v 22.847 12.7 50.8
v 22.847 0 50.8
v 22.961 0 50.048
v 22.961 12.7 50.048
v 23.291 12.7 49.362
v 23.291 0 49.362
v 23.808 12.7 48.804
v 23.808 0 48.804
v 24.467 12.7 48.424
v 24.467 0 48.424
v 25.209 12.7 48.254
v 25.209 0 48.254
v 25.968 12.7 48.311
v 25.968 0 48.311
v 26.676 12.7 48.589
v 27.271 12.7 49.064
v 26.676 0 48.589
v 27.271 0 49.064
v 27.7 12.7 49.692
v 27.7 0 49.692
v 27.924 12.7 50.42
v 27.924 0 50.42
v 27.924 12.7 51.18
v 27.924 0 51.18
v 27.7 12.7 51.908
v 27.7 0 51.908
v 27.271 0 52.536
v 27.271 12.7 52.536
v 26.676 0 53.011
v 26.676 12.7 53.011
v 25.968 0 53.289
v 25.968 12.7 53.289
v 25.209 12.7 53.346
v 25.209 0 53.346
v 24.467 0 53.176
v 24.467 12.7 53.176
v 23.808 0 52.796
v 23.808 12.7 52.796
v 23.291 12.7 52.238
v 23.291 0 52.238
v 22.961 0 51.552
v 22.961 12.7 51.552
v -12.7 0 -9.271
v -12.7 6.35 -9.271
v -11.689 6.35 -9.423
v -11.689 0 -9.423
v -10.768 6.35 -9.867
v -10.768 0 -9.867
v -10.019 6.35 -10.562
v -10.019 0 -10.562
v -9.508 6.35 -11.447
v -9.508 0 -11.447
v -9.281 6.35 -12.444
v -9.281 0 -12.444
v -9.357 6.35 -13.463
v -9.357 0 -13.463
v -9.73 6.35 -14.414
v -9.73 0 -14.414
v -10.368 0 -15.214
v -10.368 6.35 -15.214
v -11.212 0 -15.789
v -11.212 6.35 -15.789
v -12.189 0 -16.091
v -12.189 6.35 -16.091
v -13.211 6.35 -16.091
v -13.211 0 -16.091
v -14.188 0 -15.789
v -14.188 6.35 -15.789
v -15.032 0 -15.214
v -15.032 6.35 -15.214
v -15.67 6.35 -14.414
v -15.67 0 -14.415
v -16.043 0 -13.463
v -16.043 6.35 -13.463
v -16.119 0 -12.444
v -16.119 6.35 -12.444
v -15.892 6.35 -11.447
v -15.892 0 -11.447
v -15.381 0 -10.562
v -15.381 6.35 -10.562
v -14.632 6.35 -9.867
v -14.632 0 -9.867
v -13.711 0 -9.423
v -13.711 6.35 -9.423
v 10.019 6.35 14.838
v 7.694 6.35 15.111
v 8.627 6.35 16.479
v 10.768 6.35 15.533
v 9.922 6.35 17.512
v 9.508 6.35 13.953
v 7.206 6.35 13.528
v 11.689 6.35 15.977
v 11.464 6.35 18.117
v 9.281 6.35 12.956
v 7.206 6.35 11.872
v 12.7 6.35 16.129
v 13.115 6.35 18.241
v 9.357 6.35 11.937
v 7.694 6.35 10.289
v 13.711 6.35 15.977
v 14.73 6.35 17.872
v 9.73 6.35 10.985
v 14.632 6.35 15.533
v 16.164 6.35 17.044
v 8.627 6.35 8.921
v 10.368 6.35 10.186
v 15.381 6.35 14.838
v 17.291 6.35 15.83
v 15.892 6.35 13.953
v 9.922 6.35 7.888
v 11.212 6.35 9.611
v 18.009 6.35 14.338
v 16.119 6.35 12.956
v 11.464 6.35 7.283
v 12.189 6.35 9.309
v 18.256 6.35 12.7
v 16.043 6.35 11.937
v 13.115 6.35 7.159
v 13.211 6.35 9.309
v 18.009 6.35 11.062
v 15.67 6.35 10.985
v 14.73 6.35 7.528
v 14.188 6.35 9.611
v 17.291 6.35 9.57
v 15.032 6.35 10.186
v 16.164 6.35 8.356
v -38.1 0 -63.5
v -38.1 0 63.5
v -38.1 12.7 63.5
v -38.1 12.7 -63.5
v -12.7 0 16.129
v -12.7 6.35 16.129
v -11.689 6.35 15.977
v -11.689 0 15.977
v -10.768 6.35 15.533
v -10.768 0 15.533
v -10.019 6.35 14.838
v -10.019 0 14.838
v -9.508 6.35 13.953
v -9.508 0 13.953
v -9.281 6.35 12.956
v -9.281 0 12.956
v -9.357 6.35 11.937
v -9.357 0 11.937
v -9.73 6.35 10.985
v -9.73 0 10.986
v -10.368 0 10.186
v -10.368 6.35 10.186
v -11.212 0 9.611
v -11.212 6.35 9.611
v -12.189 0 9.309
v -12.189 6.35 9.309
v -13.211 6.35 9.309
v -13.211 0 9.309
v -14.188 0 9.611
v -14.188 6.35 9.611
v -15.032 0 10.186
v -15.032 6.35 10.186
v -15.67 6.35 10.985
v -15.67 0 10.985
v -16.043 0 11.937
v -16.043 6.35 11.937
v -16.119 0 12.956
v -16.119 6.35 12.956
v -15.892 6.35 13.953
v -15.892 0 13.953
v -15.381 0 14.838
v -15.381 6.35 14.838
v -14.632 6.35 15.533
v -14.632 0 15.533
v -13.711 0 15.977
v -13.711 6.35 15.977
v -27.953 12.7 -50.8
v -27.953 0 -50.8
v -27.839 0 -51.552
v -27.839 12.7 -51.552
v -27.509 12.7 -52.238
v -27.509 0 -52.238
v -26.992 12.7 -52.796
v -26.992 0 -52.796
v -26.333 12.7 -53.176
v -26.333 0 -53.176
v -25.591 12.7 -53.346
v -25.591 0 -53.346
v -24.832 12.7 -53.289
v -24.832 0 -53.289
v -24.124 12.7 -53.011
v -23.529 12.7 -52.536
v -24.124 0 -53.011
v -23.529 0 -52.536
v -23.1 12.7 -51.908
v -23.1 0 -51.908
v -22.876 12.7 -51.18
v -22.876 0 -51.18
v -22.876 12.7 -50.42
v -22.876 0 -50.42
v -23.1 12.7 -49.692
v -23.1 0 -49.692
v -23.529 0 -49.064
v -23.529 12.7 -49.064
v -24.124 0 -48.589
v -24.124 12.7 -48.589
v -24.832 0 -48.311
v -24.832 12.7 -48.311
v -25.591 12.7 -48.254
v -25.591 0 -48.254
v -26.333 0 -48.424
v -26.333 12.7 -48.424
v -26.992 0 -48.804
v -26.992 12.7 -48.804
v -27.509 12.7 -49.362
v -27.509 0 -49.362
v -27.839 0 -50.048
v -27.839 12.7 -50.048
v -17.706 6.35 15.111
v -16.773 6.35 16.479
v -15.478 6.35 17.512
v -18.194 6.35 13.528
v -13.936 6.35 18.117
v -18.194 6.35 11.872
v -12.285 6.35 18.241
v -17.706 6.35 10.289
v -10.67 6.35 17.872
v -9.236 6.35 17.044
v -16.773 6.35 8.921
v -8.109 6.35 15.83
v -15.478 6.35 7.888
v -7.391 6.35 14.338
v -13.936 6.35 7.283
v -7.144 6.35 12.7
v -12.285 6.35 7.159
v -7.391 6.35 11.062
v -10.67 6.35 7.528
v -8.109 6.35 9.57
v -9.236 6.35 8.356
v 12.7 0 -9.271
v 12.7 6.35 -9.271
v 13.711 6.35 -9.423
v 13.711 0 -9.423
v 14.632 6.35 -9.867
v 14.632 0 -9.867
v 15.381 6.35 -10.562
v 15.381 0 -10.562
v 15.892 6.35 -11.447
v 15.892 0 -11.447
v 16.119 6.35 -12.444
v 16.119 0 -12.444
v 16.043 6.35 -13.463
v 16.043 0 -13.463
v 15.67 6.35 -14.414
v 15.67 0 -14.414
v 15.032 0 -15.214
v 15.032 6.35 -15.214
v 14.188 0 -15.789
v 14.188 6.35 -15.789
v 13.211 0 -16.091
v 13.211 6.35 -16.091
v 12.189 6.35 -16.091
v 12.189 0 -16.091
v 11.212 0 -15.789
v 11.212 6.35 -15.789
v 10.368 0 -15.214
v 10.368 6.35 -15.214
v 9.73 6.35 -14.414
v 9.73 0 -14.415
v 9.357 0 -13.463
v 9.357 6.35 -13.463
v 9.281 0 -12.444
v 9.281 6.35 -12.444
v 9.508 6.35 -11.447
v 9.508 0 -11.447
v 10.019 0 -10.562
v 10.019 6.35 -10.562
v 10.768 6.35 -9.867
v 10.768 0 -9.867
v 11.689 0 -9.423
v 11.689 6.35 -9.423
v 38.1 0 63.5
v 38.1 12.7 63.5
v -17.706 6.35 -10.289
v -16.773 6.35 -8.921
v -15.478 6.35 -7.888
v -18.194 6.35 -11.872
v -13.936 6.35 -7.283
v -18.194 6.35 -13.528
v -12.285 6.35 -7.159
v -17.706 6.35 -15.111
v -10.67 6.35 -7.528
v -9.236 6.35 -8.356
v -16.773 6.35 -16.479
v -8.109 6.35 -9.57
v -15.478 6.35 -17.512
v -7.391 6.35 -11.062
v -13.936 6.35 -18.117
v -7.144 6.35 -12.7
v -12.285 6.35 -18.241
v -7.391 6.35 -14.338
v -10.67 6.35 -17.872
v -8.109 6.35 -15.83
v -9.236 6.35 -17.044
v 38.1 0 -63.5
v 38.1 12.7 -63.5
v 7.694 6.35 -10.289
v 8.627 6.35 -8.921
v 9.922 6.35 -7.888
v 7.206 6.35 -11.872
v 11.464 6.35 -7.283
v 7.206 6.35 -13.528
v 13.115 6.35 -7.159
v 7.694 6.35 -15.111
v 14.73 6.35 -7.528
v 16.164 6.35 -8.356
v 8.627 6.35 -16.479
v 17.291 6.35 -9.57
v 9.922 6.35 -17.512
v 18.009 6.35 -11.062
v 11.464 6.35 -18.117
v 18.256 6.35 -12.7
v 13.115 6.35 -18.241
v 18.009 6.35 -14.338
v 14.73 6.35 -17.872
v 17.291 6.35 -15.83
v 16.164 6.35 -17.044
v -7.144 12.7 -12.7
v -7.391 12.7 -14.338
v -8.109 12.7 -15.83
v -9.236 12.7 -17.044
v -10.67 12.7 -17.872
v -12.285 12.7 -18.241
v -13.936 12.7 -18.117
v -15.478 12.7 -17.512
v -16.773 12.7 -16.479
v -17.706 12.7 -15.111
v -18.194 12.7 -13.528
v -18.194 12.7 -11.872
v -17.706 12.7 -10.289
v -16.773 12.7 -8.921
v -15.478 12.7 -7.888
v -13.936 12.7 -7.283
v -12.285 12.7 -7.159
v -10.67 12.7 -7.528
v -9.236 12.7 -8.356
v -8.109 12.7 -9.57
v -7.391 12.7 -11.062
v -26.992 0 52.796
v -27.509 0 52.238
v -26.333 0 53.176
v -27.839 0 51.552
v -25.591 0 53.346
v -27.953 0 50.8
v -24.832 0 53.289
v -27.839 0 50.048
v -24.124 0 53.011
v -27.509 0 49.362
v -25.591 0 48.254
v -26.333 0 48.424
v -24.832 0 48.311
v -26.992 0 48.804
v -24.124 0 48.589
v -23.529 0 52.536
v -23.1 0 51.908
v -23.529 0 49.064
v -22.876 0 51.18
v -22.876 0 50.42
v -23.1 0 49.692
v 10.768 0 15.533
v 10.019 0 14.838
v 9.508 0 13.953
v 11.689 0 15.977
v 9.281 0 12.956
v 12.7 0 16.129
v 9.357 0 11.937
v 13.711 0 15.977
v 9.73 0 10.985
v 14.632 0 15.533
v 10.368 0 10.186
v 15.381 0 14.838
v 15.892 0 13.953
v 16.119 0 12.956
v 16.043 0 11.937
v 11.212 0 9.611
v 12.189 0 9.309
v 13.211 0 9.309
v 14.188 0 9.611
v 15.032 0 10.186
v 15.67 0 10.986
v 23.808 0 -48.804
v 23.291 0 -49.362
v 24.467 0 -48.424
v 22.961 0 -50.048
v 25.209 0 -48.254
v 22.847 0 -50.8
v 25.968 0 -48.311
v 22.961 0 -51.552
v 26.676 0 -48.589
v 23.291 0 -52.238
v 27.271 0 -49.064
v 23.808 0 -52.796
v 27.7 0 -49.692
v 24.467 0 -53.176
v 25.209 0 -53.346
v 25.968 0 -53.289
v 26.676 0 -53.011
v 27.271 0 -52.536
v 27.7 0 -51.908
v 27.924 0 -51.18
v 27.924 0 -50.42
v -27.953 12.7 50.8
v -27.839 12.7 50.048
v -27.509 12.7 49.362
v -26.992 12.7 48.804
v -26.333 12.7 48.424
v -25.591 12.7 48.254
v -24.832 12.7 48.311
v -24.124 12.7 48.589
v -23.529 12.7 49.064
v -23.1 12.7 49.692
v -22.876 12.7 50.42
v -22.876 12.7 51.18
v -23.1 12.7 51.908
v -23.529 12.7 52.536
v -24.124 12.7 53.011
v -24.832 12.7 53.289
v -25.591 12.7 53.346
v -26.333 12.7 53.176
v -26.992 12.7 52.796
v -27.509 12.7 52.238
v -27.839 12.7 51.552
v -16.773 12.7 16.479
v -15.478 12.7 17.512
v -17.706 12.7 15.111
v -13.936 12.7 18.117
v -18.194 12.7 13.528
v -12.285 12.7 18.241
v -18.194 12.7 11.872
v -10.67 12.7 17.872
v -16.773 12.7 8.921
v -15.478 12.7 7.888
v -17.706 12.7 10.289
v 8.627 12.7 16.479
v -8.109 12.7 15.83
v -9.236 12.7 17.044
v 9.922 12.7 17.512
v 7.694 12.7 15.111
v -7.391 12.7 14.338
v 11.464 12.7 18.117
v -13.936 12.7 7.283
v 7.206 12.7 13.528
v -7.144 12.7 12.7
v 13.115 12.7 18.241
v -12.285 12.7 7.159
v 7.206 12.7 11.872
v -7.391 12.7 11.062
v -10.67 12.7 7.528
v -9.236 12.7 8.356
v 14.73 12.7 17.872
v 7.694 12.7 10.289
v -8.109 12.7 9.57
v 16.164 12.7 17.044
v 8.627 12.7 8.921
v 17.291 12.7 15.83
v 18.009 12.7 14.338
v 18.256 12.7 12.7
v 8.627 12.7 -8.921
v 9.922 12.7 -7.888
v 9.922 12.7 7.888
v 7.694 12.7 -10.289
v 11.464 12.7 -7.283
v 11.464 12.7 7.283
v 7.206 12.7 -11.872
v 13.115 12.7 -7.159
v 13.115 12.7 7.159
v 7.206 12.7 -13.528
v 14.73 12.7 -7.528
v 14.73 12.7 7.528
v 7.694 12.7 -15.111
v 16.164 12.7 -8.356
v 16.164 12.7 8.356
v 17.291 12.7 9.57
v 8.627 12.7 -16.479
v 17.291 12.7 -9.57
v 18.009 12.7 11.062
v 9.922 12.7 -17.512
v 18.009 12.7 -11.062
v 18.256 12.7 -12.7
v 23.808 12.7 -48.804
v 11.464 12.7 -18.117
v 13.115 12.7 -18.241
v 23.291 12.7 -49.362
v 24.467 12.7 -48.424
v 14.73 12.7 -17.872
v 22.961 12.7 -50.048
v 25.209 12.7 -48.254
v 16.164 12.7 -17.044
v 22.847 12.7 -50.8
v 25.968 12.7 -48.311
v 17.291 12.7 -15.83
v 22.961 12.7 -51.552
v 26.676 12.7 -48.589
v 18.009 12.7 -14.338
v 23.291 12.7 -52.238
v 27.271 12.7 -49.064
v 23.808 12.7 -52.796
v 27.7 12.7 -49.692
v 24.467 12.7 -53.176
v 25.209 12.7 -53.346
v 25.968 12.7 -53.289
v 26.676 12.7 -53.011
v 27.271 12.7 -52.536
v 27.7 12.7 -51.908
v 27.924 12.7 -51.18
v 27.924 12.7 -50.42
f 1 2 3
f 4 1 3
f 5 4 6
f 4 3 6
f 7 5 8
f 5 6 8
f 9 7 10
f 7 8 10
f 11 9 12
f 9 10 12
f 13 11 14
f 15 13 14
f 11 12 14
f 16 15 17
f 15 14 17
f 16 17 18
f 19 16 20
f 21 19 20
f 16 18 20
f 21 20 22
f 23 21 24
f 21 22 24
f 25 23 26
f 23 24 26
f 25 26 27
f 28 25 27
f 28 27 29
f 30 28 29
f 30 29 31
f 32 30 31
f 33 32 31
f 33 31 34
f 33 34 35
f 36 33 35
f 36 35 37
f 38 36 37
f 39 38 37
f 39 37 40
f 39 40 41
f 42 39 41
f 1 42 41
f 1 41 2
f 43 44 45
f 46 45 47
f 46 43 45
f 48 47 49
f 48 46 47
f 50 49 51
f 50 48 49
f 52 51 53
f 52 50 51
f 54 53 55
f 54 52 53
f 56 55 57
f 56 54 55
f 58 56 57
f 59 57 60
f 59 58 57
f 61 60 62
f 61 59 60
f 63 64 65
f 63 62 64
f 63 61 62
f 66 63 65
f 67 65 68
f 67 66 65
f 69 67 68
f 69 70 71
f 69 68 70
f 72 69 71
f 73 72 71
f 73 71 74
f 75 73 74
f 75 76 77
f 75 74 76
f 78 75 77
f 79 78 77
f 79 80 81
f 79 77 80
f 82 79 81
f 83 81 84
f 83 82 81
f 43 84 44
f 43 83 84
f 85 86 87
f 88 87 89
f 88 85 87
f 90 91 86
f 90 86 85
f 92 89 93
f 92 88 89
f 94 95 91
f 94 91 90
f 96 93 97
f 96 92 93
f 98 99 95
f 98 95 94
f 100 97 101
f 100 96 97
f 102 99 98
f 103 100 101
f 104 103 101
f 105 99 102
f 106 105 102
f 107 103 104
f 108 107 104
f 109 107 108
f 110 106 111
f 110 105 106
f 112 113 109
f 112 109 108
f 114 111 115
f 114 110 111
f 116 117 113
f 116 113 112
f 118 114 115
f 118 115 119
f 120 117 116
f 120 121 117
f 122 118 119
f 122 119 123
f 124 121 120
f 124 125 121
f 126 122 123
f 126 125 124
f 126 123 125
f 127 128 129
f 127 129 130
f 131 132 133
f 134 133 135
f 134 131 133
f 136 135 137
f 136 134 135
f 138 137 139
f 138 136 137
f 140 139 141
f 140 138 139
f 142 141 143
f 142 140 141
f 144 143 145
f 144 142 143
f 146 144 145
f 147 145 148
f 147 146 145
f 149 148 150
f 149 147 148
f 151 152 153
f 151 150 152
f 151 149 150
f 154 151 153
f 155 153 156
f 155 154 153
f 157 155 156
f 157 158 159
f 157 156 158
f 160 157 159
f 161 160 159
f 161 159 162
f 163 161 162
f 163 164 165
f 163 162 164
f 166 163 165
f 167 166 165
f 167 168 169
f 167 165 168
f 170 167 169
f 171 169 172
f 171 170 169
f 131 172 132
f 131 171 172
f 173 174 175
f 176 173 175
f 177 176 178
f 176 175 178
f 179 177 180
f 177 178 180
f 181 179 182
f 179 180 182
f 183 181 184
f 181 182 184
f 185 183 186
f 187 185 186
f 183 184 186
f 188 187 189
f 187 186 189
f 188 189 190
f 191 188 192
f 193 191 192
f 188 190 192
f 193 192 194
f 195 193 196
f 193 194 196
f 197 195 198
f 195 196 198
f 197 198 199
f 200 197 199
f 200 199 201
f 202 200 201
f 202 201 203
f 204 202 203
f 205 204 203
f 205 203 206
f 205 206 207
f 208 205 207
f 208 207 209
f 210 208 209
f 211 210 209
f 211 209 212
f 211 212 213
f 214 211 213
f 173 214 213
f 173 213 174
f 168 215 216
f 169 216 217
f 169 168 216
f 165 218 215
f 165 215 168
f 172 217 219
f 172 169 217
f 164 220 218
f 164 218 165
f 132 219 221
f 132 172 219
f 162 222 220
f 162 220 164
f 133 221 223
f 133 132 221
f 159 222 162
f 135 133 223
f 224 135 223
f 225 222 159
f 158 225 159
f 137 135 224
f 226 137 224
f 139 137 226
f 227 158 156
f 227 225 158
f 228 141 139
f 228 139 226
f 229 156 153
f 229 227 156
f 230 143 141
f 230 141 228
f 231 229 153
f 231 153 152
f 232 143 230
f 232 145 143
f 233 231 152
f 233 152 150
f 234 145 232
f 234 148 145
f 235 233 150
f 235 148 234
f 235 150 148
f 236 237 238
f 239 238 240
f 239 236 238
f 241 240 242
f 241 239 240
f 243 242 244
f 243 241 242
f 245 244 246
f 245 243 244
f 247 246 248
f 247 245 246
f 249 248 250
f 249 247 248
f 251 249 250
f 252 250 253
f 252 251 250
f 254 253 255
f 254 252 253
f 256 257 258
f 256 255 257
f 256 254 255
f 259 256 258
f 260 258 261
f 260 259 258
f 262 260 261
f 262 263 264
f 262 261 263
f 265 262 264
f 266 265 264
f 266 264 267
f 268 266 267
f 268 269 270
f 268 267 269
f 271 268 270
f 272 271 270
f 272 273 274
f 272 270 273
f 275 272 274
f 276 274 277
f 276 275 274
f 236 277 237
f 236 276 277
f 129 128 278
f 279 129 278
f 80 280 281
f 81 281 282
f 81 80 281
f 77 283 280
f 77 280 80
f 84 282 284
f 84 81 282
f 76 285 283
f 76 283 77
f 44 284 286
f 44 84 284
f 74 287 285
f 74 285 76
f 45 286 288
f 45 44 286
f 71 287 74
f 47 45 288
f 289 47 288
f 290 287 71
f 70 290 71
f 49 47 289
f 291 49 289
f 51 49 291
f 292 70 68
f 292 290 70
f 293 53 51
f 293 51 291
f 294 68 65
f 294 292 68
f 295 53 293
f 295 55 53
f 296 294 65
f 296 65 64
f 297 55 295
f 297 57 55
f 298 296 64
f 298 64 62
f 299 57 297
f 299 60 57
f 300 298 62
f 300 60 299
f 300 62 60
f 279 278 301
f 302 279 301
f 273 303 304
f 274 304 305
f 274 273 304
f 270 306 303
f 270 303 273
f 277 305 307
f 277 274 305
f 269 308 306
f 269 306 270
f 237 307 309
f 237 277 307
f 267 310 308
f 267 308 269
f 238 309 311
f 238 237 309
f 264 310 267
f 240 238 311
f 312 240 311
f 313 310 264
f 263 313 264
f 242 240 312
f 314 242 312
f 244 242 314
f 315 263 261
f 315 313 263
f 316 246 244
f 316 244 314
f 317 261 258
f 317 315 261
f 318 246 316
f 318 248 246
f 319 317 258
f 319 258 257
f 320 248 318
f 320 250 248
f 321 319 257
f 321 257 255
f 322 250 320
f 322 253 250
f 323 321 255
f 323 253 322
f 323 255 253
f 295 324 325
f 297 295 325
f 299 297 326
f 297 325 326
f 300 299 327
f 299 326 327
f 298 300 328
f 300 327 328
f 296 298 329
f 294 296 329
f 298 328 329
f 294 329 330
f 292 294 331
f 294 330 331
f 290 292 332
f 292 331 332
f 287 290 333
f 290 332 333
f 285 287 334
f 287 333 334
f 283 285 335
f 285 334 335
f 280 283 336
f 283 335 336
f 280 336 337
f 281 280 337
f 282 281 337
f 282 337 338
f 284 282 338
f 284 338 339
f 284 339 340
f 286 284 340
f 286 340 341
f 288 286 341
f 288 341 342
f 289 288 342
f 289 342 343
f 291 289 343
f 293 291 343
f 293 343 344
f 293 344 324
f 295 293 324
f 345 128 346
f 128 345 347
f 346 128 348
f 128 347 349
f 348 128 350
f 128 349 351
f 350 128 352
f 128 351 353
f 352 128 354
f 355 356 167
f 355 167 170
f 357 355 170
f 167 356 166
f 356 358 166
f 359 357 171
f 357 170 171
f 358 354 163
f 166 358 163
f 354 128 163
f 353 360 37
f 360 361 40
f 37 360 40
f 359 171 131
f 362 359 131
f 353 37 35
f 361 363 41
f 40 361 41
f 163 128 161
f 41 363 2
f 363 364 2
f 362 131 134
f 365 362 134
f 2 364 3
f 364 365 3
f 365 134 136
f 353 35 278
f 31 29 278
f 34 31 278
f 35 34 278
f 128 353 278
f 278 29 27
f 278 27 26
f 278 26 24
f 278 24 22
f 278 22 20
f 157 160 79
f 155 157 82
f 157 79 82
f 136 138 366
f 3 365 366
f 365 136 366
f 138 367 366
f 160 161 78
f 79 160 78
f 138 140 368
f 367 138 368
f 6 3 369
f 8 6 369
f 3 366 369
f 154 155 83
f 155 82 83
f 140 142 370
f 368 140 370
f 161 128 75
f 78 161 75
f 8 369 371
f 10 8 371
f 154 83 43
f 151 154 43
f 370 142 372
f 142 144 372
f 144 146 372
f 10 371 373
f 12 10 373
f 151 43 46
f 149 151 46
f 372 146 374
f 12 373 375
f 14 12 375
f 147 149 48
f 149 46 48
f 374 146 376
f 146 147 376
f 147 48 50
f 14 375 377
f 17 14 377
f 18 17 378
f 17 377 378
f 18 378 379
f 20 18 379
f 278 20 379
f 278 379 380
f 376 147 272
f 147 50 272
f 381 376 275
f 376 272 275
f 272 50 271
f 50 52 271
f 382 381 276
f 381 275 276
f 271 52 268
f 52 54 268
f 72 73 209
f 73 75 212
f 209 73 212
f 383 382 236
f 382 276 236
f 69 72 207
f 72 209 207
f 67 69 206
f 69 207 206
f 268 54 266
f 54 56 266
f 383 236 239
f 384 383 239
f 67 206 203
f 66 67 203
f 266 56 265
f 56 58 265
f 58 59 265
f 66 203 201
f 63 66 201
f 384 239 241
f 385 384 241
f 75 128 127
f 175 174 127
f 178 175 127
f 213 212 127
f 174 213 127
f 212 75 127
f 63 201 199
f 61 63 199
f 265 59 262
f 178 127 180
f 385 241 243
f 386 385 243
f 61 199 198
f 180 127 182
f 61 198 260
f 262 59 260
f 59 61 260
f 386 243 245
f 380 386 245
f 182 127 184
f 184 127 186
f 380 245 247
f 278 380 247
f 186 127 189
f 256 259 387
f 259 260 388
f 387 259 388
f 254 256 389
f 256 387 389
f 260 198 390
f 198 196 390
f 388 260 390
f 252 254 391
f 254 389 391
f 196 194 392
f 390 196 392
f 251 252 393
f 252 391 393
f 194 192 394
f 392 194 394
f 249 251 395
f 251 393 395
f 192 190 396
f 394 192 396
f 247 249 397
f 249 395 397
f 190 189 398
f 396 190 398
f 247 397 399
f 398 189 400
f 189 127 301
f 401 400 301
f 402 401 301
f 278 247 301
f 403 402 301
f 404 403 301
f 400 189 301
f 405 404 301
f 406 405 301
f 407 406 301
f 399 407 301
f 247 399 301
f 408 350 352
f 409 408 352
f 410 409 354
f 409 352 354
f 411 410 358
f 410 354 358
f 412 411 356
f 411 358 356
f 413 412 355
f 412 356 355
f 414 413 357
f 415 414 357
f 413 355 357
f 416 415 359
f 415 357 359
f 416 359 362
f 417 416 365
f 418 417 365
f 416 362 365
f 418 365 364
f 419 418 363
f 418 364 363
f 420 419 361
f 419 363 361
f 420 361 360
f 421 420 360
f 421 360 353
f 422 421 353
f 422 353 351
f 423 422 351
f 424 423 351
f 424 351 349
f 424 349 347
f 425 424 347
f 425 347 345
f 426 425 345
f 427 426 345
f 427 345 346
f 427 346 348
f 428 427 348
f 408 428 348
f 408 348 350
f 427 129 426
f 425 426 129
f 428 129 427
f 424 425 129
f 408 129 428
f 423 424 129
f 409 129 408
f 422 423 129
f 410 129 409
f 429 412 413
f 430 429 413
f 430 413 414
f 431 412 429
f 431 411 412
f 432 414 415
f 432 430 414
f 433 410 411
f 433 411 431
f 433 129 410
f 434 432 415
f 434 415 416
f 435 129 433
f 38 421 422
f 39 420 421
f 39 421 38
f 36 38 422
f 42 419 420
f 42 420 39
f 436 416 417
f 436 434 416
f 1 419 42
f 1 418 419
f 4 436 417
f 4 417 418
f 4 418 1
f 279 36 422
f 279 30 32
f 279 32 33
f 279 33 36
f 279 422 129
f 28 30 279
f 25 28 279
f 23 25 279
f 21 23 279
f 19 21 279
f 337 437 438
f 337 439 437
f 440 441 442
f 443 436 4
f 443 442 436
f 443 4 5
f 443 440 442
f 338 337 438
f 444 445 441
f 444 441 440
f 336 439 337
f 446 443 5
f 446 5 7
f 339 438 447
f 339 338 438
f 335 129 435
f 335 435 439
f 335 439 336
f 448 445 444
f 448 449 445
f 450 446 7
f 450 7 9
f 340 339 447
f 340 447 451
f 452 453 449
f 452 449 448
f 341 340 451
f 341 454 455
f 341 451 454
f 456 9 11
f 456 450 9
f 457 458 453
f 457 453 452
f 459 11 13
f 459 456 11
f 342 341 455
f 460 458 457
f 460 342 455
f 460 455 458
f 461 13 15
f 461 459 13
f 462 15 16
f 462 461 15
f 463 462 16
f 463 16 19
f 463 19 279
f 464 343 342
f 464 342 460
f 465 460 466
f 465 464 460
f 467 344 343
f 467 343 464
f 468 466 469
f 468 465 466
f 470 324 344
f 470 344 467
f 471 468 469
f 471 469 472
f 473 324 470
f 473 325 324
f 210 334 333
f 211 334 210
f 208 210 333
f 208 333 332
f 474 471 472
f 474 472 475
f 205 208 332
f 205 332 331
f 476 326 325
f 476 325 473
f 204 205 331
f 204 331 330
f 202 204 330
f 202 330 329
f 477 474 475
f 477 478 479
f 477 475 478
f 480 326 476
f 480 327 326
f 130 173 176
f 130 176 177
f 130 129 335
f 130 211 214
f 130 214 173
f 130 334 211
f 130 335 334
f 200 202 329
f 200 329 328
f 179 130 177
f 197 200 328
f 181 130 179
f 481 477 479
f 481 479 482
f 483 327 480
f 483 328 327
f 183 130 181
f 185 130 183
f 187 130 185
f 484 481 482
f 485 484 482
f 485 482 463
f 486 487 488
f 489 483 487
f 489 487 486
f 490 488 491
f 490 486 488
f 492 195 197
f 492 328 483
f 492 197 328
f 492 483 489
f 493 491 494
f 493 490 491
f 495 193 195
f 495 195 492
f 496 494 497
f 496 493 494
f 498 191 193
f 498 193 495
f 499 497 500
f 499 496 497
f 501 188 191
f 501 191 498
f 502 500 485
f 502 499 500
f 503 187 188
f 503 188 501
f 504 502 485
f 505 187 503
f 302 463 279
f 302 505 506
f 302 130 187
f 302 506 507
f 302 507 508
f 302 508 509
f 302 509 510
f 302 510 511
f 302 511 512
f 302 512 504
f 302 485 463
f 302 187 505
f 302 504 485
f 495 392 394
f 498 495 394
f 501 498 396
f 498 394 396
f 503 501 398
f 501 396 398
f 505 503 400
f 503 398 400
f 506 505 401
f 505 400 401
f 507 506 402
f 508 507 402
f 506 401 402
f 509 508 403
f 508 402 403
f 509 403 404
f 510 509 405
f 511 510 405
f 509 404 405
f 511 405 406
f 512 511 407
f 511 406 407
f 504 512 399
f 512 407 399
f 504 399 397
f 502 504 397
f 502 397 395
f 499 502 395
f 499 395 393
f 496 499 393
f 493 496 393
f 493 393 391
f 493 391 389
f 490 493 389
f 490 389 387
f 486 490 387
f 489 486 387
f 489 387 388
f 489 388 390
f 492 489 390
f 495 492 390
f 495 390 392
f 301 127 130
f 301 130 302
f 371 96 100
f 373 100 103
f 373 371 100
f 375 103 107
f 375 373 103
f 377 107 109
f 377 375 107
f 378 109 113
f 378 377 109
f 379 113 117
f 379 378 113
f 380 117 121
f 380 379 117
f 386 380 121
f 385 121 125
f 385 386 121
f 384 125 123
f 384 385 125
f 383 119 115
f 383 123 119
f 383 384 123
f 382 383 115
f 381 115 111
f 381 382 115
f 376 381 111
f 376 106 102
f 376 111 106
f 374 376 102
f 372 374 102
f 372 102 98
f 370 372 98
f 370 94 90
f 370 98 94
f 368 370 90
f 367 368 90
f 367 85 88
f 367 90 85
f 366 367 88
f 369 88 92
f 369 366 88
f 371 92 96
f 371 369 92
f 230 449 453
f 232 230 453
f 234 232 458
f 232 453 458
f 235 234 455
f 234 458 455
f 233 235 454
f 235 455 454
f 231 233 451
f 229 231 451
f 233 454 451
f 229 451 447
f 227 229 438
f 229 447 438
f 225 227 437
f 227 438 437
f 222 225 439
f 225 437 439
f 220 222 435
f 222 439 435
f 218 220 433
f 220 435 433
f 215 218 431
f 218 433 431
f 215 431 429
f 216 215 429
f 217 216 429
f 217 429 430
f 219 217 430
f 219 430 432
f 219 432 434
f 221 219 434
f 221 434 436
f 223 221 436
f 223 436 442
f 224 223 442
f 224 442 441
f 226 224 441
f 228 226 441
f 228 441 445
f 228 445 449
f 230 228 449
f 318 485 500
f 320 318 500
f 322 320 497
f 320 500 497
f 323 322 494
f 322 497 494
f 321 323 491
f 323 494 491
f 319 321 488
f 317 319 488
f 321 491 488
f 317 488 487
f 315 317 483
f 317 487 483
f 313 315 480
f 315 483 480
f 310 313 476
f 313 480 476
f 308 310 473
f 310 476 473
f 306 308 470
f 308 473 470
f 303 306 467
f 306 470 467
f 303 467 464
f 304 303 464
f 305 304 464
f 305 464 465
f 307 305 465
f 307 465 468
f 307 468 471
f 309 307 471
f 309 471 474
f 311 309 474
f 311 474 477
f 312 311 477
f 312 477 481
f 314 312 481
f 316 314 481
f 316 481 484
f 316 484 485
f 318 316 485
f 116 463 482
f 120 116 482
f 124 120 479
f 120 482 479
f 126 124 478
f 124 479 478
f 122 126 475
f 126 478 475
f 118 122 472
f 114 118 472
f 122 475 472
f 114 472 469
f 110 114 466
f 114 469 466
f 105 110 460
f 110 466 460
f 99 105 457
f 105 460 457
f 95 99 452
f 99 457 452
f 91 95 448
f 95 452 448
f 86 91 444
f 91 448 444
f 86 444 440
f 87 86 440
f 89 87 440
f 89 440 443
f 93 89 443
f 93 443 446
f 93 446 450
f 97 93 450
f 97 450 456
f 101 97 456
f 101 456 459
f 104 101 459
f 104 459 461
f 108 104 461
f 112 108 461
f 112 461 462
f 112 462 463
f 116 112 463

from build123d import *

# Parameters (mm, degrees)
SKETCH1_W                                        = 76.2
SKETCH1_H                                        = 127
SKETCH1_R                                        = 3.429
BOSS_EXTRUDE1_DEPTH                              = 12.7
CBORE_FOR_1_4_SOCKET_HEAD_CAP_SCREW1_D           = 6.7564
CBORE_FOR_1_4_SOCKET_HEAD_CAP_SCREW1_CBORE_D     = 11.1125
CBORE_FOR_1_4_SOCKET_HEAD_CAP_SCREW1_CBORE_DEPTH = 6.35
F_1_4_20_TAPPED_HOLE1_D                          = 5.1054


with BuildPart() as part:
    # Sketch1 → Boss-Extrude1 (new body)
    with BuildSketch(Plane(origin=(0, 0, 0), x_dir=(1, 0, 0), z_dir=(0, 1, 0))):
        Rectangle(SKETCH1_W, SKETCH1_H)
        with Locations(Location((-12.7, 12.7, 0), (0, 0, 270))):
            Circle(SKETCH1_R, mode=Mode.SUBTRACT)
        with Locations(Location((12.7, 12.7, 0), (0, 0, 270))):
            Circle(SKETCH1_R, mode=Mode.SUBTRACT)
        with Locations(Location((12.7, -12.7, 0), (0, 0, 270))):
            Circle(SKETCH1_R, mode=Mode.SUBTRACT)
        with Locations(Location((-12.7, -12.7, 0), (0, 0, 270))):
            Circle(SKETCH1_R, mode=Mode.SUBTRACT)
    extrude(amount=BOSS_EXTRUDE1_DEPTH)

    # CBORE for 1/4 Socket Head Cap Screw1 (through all)
    with Locations(Plane(origin=(0, 12.7, 0), x_dir=(1, 0, 0), z_dir=(0, 1, 0))):
        with Locations((-12.7, 12.7), (12.7, 12.7), (12.7, -12.7), (-12.7, -12.7), (-108.226831433, 58.259256328)):
            CounterBoreHole(CBORE_FOR_1_4_SOCKET_HEAD_CAP_SCREW1_D / 2, CBORE_FOR_1_4_SOCKET_HEAD_CAP_SCREW1_CBORE_D / 2, CBORE_FOR_1_4_SOCKET_HEAD_CAP_SCREW1_CBORE_DEPTH)

    # 1/4-20 Tapped Hole1 (through all)
    with Locations(Plane(origin=(0, 12.7, 0), x_dir=(1, 0, 0), z_dir=(0, 1, 0))):
        with Locations((25.4, 50.8), (-25.4, 50.8), (-25.4, -50.8), (25.4, -50.8)):
            Hole(F_1_4_20_TAPPED_HOLE1_D / 2)


solid = part.part
